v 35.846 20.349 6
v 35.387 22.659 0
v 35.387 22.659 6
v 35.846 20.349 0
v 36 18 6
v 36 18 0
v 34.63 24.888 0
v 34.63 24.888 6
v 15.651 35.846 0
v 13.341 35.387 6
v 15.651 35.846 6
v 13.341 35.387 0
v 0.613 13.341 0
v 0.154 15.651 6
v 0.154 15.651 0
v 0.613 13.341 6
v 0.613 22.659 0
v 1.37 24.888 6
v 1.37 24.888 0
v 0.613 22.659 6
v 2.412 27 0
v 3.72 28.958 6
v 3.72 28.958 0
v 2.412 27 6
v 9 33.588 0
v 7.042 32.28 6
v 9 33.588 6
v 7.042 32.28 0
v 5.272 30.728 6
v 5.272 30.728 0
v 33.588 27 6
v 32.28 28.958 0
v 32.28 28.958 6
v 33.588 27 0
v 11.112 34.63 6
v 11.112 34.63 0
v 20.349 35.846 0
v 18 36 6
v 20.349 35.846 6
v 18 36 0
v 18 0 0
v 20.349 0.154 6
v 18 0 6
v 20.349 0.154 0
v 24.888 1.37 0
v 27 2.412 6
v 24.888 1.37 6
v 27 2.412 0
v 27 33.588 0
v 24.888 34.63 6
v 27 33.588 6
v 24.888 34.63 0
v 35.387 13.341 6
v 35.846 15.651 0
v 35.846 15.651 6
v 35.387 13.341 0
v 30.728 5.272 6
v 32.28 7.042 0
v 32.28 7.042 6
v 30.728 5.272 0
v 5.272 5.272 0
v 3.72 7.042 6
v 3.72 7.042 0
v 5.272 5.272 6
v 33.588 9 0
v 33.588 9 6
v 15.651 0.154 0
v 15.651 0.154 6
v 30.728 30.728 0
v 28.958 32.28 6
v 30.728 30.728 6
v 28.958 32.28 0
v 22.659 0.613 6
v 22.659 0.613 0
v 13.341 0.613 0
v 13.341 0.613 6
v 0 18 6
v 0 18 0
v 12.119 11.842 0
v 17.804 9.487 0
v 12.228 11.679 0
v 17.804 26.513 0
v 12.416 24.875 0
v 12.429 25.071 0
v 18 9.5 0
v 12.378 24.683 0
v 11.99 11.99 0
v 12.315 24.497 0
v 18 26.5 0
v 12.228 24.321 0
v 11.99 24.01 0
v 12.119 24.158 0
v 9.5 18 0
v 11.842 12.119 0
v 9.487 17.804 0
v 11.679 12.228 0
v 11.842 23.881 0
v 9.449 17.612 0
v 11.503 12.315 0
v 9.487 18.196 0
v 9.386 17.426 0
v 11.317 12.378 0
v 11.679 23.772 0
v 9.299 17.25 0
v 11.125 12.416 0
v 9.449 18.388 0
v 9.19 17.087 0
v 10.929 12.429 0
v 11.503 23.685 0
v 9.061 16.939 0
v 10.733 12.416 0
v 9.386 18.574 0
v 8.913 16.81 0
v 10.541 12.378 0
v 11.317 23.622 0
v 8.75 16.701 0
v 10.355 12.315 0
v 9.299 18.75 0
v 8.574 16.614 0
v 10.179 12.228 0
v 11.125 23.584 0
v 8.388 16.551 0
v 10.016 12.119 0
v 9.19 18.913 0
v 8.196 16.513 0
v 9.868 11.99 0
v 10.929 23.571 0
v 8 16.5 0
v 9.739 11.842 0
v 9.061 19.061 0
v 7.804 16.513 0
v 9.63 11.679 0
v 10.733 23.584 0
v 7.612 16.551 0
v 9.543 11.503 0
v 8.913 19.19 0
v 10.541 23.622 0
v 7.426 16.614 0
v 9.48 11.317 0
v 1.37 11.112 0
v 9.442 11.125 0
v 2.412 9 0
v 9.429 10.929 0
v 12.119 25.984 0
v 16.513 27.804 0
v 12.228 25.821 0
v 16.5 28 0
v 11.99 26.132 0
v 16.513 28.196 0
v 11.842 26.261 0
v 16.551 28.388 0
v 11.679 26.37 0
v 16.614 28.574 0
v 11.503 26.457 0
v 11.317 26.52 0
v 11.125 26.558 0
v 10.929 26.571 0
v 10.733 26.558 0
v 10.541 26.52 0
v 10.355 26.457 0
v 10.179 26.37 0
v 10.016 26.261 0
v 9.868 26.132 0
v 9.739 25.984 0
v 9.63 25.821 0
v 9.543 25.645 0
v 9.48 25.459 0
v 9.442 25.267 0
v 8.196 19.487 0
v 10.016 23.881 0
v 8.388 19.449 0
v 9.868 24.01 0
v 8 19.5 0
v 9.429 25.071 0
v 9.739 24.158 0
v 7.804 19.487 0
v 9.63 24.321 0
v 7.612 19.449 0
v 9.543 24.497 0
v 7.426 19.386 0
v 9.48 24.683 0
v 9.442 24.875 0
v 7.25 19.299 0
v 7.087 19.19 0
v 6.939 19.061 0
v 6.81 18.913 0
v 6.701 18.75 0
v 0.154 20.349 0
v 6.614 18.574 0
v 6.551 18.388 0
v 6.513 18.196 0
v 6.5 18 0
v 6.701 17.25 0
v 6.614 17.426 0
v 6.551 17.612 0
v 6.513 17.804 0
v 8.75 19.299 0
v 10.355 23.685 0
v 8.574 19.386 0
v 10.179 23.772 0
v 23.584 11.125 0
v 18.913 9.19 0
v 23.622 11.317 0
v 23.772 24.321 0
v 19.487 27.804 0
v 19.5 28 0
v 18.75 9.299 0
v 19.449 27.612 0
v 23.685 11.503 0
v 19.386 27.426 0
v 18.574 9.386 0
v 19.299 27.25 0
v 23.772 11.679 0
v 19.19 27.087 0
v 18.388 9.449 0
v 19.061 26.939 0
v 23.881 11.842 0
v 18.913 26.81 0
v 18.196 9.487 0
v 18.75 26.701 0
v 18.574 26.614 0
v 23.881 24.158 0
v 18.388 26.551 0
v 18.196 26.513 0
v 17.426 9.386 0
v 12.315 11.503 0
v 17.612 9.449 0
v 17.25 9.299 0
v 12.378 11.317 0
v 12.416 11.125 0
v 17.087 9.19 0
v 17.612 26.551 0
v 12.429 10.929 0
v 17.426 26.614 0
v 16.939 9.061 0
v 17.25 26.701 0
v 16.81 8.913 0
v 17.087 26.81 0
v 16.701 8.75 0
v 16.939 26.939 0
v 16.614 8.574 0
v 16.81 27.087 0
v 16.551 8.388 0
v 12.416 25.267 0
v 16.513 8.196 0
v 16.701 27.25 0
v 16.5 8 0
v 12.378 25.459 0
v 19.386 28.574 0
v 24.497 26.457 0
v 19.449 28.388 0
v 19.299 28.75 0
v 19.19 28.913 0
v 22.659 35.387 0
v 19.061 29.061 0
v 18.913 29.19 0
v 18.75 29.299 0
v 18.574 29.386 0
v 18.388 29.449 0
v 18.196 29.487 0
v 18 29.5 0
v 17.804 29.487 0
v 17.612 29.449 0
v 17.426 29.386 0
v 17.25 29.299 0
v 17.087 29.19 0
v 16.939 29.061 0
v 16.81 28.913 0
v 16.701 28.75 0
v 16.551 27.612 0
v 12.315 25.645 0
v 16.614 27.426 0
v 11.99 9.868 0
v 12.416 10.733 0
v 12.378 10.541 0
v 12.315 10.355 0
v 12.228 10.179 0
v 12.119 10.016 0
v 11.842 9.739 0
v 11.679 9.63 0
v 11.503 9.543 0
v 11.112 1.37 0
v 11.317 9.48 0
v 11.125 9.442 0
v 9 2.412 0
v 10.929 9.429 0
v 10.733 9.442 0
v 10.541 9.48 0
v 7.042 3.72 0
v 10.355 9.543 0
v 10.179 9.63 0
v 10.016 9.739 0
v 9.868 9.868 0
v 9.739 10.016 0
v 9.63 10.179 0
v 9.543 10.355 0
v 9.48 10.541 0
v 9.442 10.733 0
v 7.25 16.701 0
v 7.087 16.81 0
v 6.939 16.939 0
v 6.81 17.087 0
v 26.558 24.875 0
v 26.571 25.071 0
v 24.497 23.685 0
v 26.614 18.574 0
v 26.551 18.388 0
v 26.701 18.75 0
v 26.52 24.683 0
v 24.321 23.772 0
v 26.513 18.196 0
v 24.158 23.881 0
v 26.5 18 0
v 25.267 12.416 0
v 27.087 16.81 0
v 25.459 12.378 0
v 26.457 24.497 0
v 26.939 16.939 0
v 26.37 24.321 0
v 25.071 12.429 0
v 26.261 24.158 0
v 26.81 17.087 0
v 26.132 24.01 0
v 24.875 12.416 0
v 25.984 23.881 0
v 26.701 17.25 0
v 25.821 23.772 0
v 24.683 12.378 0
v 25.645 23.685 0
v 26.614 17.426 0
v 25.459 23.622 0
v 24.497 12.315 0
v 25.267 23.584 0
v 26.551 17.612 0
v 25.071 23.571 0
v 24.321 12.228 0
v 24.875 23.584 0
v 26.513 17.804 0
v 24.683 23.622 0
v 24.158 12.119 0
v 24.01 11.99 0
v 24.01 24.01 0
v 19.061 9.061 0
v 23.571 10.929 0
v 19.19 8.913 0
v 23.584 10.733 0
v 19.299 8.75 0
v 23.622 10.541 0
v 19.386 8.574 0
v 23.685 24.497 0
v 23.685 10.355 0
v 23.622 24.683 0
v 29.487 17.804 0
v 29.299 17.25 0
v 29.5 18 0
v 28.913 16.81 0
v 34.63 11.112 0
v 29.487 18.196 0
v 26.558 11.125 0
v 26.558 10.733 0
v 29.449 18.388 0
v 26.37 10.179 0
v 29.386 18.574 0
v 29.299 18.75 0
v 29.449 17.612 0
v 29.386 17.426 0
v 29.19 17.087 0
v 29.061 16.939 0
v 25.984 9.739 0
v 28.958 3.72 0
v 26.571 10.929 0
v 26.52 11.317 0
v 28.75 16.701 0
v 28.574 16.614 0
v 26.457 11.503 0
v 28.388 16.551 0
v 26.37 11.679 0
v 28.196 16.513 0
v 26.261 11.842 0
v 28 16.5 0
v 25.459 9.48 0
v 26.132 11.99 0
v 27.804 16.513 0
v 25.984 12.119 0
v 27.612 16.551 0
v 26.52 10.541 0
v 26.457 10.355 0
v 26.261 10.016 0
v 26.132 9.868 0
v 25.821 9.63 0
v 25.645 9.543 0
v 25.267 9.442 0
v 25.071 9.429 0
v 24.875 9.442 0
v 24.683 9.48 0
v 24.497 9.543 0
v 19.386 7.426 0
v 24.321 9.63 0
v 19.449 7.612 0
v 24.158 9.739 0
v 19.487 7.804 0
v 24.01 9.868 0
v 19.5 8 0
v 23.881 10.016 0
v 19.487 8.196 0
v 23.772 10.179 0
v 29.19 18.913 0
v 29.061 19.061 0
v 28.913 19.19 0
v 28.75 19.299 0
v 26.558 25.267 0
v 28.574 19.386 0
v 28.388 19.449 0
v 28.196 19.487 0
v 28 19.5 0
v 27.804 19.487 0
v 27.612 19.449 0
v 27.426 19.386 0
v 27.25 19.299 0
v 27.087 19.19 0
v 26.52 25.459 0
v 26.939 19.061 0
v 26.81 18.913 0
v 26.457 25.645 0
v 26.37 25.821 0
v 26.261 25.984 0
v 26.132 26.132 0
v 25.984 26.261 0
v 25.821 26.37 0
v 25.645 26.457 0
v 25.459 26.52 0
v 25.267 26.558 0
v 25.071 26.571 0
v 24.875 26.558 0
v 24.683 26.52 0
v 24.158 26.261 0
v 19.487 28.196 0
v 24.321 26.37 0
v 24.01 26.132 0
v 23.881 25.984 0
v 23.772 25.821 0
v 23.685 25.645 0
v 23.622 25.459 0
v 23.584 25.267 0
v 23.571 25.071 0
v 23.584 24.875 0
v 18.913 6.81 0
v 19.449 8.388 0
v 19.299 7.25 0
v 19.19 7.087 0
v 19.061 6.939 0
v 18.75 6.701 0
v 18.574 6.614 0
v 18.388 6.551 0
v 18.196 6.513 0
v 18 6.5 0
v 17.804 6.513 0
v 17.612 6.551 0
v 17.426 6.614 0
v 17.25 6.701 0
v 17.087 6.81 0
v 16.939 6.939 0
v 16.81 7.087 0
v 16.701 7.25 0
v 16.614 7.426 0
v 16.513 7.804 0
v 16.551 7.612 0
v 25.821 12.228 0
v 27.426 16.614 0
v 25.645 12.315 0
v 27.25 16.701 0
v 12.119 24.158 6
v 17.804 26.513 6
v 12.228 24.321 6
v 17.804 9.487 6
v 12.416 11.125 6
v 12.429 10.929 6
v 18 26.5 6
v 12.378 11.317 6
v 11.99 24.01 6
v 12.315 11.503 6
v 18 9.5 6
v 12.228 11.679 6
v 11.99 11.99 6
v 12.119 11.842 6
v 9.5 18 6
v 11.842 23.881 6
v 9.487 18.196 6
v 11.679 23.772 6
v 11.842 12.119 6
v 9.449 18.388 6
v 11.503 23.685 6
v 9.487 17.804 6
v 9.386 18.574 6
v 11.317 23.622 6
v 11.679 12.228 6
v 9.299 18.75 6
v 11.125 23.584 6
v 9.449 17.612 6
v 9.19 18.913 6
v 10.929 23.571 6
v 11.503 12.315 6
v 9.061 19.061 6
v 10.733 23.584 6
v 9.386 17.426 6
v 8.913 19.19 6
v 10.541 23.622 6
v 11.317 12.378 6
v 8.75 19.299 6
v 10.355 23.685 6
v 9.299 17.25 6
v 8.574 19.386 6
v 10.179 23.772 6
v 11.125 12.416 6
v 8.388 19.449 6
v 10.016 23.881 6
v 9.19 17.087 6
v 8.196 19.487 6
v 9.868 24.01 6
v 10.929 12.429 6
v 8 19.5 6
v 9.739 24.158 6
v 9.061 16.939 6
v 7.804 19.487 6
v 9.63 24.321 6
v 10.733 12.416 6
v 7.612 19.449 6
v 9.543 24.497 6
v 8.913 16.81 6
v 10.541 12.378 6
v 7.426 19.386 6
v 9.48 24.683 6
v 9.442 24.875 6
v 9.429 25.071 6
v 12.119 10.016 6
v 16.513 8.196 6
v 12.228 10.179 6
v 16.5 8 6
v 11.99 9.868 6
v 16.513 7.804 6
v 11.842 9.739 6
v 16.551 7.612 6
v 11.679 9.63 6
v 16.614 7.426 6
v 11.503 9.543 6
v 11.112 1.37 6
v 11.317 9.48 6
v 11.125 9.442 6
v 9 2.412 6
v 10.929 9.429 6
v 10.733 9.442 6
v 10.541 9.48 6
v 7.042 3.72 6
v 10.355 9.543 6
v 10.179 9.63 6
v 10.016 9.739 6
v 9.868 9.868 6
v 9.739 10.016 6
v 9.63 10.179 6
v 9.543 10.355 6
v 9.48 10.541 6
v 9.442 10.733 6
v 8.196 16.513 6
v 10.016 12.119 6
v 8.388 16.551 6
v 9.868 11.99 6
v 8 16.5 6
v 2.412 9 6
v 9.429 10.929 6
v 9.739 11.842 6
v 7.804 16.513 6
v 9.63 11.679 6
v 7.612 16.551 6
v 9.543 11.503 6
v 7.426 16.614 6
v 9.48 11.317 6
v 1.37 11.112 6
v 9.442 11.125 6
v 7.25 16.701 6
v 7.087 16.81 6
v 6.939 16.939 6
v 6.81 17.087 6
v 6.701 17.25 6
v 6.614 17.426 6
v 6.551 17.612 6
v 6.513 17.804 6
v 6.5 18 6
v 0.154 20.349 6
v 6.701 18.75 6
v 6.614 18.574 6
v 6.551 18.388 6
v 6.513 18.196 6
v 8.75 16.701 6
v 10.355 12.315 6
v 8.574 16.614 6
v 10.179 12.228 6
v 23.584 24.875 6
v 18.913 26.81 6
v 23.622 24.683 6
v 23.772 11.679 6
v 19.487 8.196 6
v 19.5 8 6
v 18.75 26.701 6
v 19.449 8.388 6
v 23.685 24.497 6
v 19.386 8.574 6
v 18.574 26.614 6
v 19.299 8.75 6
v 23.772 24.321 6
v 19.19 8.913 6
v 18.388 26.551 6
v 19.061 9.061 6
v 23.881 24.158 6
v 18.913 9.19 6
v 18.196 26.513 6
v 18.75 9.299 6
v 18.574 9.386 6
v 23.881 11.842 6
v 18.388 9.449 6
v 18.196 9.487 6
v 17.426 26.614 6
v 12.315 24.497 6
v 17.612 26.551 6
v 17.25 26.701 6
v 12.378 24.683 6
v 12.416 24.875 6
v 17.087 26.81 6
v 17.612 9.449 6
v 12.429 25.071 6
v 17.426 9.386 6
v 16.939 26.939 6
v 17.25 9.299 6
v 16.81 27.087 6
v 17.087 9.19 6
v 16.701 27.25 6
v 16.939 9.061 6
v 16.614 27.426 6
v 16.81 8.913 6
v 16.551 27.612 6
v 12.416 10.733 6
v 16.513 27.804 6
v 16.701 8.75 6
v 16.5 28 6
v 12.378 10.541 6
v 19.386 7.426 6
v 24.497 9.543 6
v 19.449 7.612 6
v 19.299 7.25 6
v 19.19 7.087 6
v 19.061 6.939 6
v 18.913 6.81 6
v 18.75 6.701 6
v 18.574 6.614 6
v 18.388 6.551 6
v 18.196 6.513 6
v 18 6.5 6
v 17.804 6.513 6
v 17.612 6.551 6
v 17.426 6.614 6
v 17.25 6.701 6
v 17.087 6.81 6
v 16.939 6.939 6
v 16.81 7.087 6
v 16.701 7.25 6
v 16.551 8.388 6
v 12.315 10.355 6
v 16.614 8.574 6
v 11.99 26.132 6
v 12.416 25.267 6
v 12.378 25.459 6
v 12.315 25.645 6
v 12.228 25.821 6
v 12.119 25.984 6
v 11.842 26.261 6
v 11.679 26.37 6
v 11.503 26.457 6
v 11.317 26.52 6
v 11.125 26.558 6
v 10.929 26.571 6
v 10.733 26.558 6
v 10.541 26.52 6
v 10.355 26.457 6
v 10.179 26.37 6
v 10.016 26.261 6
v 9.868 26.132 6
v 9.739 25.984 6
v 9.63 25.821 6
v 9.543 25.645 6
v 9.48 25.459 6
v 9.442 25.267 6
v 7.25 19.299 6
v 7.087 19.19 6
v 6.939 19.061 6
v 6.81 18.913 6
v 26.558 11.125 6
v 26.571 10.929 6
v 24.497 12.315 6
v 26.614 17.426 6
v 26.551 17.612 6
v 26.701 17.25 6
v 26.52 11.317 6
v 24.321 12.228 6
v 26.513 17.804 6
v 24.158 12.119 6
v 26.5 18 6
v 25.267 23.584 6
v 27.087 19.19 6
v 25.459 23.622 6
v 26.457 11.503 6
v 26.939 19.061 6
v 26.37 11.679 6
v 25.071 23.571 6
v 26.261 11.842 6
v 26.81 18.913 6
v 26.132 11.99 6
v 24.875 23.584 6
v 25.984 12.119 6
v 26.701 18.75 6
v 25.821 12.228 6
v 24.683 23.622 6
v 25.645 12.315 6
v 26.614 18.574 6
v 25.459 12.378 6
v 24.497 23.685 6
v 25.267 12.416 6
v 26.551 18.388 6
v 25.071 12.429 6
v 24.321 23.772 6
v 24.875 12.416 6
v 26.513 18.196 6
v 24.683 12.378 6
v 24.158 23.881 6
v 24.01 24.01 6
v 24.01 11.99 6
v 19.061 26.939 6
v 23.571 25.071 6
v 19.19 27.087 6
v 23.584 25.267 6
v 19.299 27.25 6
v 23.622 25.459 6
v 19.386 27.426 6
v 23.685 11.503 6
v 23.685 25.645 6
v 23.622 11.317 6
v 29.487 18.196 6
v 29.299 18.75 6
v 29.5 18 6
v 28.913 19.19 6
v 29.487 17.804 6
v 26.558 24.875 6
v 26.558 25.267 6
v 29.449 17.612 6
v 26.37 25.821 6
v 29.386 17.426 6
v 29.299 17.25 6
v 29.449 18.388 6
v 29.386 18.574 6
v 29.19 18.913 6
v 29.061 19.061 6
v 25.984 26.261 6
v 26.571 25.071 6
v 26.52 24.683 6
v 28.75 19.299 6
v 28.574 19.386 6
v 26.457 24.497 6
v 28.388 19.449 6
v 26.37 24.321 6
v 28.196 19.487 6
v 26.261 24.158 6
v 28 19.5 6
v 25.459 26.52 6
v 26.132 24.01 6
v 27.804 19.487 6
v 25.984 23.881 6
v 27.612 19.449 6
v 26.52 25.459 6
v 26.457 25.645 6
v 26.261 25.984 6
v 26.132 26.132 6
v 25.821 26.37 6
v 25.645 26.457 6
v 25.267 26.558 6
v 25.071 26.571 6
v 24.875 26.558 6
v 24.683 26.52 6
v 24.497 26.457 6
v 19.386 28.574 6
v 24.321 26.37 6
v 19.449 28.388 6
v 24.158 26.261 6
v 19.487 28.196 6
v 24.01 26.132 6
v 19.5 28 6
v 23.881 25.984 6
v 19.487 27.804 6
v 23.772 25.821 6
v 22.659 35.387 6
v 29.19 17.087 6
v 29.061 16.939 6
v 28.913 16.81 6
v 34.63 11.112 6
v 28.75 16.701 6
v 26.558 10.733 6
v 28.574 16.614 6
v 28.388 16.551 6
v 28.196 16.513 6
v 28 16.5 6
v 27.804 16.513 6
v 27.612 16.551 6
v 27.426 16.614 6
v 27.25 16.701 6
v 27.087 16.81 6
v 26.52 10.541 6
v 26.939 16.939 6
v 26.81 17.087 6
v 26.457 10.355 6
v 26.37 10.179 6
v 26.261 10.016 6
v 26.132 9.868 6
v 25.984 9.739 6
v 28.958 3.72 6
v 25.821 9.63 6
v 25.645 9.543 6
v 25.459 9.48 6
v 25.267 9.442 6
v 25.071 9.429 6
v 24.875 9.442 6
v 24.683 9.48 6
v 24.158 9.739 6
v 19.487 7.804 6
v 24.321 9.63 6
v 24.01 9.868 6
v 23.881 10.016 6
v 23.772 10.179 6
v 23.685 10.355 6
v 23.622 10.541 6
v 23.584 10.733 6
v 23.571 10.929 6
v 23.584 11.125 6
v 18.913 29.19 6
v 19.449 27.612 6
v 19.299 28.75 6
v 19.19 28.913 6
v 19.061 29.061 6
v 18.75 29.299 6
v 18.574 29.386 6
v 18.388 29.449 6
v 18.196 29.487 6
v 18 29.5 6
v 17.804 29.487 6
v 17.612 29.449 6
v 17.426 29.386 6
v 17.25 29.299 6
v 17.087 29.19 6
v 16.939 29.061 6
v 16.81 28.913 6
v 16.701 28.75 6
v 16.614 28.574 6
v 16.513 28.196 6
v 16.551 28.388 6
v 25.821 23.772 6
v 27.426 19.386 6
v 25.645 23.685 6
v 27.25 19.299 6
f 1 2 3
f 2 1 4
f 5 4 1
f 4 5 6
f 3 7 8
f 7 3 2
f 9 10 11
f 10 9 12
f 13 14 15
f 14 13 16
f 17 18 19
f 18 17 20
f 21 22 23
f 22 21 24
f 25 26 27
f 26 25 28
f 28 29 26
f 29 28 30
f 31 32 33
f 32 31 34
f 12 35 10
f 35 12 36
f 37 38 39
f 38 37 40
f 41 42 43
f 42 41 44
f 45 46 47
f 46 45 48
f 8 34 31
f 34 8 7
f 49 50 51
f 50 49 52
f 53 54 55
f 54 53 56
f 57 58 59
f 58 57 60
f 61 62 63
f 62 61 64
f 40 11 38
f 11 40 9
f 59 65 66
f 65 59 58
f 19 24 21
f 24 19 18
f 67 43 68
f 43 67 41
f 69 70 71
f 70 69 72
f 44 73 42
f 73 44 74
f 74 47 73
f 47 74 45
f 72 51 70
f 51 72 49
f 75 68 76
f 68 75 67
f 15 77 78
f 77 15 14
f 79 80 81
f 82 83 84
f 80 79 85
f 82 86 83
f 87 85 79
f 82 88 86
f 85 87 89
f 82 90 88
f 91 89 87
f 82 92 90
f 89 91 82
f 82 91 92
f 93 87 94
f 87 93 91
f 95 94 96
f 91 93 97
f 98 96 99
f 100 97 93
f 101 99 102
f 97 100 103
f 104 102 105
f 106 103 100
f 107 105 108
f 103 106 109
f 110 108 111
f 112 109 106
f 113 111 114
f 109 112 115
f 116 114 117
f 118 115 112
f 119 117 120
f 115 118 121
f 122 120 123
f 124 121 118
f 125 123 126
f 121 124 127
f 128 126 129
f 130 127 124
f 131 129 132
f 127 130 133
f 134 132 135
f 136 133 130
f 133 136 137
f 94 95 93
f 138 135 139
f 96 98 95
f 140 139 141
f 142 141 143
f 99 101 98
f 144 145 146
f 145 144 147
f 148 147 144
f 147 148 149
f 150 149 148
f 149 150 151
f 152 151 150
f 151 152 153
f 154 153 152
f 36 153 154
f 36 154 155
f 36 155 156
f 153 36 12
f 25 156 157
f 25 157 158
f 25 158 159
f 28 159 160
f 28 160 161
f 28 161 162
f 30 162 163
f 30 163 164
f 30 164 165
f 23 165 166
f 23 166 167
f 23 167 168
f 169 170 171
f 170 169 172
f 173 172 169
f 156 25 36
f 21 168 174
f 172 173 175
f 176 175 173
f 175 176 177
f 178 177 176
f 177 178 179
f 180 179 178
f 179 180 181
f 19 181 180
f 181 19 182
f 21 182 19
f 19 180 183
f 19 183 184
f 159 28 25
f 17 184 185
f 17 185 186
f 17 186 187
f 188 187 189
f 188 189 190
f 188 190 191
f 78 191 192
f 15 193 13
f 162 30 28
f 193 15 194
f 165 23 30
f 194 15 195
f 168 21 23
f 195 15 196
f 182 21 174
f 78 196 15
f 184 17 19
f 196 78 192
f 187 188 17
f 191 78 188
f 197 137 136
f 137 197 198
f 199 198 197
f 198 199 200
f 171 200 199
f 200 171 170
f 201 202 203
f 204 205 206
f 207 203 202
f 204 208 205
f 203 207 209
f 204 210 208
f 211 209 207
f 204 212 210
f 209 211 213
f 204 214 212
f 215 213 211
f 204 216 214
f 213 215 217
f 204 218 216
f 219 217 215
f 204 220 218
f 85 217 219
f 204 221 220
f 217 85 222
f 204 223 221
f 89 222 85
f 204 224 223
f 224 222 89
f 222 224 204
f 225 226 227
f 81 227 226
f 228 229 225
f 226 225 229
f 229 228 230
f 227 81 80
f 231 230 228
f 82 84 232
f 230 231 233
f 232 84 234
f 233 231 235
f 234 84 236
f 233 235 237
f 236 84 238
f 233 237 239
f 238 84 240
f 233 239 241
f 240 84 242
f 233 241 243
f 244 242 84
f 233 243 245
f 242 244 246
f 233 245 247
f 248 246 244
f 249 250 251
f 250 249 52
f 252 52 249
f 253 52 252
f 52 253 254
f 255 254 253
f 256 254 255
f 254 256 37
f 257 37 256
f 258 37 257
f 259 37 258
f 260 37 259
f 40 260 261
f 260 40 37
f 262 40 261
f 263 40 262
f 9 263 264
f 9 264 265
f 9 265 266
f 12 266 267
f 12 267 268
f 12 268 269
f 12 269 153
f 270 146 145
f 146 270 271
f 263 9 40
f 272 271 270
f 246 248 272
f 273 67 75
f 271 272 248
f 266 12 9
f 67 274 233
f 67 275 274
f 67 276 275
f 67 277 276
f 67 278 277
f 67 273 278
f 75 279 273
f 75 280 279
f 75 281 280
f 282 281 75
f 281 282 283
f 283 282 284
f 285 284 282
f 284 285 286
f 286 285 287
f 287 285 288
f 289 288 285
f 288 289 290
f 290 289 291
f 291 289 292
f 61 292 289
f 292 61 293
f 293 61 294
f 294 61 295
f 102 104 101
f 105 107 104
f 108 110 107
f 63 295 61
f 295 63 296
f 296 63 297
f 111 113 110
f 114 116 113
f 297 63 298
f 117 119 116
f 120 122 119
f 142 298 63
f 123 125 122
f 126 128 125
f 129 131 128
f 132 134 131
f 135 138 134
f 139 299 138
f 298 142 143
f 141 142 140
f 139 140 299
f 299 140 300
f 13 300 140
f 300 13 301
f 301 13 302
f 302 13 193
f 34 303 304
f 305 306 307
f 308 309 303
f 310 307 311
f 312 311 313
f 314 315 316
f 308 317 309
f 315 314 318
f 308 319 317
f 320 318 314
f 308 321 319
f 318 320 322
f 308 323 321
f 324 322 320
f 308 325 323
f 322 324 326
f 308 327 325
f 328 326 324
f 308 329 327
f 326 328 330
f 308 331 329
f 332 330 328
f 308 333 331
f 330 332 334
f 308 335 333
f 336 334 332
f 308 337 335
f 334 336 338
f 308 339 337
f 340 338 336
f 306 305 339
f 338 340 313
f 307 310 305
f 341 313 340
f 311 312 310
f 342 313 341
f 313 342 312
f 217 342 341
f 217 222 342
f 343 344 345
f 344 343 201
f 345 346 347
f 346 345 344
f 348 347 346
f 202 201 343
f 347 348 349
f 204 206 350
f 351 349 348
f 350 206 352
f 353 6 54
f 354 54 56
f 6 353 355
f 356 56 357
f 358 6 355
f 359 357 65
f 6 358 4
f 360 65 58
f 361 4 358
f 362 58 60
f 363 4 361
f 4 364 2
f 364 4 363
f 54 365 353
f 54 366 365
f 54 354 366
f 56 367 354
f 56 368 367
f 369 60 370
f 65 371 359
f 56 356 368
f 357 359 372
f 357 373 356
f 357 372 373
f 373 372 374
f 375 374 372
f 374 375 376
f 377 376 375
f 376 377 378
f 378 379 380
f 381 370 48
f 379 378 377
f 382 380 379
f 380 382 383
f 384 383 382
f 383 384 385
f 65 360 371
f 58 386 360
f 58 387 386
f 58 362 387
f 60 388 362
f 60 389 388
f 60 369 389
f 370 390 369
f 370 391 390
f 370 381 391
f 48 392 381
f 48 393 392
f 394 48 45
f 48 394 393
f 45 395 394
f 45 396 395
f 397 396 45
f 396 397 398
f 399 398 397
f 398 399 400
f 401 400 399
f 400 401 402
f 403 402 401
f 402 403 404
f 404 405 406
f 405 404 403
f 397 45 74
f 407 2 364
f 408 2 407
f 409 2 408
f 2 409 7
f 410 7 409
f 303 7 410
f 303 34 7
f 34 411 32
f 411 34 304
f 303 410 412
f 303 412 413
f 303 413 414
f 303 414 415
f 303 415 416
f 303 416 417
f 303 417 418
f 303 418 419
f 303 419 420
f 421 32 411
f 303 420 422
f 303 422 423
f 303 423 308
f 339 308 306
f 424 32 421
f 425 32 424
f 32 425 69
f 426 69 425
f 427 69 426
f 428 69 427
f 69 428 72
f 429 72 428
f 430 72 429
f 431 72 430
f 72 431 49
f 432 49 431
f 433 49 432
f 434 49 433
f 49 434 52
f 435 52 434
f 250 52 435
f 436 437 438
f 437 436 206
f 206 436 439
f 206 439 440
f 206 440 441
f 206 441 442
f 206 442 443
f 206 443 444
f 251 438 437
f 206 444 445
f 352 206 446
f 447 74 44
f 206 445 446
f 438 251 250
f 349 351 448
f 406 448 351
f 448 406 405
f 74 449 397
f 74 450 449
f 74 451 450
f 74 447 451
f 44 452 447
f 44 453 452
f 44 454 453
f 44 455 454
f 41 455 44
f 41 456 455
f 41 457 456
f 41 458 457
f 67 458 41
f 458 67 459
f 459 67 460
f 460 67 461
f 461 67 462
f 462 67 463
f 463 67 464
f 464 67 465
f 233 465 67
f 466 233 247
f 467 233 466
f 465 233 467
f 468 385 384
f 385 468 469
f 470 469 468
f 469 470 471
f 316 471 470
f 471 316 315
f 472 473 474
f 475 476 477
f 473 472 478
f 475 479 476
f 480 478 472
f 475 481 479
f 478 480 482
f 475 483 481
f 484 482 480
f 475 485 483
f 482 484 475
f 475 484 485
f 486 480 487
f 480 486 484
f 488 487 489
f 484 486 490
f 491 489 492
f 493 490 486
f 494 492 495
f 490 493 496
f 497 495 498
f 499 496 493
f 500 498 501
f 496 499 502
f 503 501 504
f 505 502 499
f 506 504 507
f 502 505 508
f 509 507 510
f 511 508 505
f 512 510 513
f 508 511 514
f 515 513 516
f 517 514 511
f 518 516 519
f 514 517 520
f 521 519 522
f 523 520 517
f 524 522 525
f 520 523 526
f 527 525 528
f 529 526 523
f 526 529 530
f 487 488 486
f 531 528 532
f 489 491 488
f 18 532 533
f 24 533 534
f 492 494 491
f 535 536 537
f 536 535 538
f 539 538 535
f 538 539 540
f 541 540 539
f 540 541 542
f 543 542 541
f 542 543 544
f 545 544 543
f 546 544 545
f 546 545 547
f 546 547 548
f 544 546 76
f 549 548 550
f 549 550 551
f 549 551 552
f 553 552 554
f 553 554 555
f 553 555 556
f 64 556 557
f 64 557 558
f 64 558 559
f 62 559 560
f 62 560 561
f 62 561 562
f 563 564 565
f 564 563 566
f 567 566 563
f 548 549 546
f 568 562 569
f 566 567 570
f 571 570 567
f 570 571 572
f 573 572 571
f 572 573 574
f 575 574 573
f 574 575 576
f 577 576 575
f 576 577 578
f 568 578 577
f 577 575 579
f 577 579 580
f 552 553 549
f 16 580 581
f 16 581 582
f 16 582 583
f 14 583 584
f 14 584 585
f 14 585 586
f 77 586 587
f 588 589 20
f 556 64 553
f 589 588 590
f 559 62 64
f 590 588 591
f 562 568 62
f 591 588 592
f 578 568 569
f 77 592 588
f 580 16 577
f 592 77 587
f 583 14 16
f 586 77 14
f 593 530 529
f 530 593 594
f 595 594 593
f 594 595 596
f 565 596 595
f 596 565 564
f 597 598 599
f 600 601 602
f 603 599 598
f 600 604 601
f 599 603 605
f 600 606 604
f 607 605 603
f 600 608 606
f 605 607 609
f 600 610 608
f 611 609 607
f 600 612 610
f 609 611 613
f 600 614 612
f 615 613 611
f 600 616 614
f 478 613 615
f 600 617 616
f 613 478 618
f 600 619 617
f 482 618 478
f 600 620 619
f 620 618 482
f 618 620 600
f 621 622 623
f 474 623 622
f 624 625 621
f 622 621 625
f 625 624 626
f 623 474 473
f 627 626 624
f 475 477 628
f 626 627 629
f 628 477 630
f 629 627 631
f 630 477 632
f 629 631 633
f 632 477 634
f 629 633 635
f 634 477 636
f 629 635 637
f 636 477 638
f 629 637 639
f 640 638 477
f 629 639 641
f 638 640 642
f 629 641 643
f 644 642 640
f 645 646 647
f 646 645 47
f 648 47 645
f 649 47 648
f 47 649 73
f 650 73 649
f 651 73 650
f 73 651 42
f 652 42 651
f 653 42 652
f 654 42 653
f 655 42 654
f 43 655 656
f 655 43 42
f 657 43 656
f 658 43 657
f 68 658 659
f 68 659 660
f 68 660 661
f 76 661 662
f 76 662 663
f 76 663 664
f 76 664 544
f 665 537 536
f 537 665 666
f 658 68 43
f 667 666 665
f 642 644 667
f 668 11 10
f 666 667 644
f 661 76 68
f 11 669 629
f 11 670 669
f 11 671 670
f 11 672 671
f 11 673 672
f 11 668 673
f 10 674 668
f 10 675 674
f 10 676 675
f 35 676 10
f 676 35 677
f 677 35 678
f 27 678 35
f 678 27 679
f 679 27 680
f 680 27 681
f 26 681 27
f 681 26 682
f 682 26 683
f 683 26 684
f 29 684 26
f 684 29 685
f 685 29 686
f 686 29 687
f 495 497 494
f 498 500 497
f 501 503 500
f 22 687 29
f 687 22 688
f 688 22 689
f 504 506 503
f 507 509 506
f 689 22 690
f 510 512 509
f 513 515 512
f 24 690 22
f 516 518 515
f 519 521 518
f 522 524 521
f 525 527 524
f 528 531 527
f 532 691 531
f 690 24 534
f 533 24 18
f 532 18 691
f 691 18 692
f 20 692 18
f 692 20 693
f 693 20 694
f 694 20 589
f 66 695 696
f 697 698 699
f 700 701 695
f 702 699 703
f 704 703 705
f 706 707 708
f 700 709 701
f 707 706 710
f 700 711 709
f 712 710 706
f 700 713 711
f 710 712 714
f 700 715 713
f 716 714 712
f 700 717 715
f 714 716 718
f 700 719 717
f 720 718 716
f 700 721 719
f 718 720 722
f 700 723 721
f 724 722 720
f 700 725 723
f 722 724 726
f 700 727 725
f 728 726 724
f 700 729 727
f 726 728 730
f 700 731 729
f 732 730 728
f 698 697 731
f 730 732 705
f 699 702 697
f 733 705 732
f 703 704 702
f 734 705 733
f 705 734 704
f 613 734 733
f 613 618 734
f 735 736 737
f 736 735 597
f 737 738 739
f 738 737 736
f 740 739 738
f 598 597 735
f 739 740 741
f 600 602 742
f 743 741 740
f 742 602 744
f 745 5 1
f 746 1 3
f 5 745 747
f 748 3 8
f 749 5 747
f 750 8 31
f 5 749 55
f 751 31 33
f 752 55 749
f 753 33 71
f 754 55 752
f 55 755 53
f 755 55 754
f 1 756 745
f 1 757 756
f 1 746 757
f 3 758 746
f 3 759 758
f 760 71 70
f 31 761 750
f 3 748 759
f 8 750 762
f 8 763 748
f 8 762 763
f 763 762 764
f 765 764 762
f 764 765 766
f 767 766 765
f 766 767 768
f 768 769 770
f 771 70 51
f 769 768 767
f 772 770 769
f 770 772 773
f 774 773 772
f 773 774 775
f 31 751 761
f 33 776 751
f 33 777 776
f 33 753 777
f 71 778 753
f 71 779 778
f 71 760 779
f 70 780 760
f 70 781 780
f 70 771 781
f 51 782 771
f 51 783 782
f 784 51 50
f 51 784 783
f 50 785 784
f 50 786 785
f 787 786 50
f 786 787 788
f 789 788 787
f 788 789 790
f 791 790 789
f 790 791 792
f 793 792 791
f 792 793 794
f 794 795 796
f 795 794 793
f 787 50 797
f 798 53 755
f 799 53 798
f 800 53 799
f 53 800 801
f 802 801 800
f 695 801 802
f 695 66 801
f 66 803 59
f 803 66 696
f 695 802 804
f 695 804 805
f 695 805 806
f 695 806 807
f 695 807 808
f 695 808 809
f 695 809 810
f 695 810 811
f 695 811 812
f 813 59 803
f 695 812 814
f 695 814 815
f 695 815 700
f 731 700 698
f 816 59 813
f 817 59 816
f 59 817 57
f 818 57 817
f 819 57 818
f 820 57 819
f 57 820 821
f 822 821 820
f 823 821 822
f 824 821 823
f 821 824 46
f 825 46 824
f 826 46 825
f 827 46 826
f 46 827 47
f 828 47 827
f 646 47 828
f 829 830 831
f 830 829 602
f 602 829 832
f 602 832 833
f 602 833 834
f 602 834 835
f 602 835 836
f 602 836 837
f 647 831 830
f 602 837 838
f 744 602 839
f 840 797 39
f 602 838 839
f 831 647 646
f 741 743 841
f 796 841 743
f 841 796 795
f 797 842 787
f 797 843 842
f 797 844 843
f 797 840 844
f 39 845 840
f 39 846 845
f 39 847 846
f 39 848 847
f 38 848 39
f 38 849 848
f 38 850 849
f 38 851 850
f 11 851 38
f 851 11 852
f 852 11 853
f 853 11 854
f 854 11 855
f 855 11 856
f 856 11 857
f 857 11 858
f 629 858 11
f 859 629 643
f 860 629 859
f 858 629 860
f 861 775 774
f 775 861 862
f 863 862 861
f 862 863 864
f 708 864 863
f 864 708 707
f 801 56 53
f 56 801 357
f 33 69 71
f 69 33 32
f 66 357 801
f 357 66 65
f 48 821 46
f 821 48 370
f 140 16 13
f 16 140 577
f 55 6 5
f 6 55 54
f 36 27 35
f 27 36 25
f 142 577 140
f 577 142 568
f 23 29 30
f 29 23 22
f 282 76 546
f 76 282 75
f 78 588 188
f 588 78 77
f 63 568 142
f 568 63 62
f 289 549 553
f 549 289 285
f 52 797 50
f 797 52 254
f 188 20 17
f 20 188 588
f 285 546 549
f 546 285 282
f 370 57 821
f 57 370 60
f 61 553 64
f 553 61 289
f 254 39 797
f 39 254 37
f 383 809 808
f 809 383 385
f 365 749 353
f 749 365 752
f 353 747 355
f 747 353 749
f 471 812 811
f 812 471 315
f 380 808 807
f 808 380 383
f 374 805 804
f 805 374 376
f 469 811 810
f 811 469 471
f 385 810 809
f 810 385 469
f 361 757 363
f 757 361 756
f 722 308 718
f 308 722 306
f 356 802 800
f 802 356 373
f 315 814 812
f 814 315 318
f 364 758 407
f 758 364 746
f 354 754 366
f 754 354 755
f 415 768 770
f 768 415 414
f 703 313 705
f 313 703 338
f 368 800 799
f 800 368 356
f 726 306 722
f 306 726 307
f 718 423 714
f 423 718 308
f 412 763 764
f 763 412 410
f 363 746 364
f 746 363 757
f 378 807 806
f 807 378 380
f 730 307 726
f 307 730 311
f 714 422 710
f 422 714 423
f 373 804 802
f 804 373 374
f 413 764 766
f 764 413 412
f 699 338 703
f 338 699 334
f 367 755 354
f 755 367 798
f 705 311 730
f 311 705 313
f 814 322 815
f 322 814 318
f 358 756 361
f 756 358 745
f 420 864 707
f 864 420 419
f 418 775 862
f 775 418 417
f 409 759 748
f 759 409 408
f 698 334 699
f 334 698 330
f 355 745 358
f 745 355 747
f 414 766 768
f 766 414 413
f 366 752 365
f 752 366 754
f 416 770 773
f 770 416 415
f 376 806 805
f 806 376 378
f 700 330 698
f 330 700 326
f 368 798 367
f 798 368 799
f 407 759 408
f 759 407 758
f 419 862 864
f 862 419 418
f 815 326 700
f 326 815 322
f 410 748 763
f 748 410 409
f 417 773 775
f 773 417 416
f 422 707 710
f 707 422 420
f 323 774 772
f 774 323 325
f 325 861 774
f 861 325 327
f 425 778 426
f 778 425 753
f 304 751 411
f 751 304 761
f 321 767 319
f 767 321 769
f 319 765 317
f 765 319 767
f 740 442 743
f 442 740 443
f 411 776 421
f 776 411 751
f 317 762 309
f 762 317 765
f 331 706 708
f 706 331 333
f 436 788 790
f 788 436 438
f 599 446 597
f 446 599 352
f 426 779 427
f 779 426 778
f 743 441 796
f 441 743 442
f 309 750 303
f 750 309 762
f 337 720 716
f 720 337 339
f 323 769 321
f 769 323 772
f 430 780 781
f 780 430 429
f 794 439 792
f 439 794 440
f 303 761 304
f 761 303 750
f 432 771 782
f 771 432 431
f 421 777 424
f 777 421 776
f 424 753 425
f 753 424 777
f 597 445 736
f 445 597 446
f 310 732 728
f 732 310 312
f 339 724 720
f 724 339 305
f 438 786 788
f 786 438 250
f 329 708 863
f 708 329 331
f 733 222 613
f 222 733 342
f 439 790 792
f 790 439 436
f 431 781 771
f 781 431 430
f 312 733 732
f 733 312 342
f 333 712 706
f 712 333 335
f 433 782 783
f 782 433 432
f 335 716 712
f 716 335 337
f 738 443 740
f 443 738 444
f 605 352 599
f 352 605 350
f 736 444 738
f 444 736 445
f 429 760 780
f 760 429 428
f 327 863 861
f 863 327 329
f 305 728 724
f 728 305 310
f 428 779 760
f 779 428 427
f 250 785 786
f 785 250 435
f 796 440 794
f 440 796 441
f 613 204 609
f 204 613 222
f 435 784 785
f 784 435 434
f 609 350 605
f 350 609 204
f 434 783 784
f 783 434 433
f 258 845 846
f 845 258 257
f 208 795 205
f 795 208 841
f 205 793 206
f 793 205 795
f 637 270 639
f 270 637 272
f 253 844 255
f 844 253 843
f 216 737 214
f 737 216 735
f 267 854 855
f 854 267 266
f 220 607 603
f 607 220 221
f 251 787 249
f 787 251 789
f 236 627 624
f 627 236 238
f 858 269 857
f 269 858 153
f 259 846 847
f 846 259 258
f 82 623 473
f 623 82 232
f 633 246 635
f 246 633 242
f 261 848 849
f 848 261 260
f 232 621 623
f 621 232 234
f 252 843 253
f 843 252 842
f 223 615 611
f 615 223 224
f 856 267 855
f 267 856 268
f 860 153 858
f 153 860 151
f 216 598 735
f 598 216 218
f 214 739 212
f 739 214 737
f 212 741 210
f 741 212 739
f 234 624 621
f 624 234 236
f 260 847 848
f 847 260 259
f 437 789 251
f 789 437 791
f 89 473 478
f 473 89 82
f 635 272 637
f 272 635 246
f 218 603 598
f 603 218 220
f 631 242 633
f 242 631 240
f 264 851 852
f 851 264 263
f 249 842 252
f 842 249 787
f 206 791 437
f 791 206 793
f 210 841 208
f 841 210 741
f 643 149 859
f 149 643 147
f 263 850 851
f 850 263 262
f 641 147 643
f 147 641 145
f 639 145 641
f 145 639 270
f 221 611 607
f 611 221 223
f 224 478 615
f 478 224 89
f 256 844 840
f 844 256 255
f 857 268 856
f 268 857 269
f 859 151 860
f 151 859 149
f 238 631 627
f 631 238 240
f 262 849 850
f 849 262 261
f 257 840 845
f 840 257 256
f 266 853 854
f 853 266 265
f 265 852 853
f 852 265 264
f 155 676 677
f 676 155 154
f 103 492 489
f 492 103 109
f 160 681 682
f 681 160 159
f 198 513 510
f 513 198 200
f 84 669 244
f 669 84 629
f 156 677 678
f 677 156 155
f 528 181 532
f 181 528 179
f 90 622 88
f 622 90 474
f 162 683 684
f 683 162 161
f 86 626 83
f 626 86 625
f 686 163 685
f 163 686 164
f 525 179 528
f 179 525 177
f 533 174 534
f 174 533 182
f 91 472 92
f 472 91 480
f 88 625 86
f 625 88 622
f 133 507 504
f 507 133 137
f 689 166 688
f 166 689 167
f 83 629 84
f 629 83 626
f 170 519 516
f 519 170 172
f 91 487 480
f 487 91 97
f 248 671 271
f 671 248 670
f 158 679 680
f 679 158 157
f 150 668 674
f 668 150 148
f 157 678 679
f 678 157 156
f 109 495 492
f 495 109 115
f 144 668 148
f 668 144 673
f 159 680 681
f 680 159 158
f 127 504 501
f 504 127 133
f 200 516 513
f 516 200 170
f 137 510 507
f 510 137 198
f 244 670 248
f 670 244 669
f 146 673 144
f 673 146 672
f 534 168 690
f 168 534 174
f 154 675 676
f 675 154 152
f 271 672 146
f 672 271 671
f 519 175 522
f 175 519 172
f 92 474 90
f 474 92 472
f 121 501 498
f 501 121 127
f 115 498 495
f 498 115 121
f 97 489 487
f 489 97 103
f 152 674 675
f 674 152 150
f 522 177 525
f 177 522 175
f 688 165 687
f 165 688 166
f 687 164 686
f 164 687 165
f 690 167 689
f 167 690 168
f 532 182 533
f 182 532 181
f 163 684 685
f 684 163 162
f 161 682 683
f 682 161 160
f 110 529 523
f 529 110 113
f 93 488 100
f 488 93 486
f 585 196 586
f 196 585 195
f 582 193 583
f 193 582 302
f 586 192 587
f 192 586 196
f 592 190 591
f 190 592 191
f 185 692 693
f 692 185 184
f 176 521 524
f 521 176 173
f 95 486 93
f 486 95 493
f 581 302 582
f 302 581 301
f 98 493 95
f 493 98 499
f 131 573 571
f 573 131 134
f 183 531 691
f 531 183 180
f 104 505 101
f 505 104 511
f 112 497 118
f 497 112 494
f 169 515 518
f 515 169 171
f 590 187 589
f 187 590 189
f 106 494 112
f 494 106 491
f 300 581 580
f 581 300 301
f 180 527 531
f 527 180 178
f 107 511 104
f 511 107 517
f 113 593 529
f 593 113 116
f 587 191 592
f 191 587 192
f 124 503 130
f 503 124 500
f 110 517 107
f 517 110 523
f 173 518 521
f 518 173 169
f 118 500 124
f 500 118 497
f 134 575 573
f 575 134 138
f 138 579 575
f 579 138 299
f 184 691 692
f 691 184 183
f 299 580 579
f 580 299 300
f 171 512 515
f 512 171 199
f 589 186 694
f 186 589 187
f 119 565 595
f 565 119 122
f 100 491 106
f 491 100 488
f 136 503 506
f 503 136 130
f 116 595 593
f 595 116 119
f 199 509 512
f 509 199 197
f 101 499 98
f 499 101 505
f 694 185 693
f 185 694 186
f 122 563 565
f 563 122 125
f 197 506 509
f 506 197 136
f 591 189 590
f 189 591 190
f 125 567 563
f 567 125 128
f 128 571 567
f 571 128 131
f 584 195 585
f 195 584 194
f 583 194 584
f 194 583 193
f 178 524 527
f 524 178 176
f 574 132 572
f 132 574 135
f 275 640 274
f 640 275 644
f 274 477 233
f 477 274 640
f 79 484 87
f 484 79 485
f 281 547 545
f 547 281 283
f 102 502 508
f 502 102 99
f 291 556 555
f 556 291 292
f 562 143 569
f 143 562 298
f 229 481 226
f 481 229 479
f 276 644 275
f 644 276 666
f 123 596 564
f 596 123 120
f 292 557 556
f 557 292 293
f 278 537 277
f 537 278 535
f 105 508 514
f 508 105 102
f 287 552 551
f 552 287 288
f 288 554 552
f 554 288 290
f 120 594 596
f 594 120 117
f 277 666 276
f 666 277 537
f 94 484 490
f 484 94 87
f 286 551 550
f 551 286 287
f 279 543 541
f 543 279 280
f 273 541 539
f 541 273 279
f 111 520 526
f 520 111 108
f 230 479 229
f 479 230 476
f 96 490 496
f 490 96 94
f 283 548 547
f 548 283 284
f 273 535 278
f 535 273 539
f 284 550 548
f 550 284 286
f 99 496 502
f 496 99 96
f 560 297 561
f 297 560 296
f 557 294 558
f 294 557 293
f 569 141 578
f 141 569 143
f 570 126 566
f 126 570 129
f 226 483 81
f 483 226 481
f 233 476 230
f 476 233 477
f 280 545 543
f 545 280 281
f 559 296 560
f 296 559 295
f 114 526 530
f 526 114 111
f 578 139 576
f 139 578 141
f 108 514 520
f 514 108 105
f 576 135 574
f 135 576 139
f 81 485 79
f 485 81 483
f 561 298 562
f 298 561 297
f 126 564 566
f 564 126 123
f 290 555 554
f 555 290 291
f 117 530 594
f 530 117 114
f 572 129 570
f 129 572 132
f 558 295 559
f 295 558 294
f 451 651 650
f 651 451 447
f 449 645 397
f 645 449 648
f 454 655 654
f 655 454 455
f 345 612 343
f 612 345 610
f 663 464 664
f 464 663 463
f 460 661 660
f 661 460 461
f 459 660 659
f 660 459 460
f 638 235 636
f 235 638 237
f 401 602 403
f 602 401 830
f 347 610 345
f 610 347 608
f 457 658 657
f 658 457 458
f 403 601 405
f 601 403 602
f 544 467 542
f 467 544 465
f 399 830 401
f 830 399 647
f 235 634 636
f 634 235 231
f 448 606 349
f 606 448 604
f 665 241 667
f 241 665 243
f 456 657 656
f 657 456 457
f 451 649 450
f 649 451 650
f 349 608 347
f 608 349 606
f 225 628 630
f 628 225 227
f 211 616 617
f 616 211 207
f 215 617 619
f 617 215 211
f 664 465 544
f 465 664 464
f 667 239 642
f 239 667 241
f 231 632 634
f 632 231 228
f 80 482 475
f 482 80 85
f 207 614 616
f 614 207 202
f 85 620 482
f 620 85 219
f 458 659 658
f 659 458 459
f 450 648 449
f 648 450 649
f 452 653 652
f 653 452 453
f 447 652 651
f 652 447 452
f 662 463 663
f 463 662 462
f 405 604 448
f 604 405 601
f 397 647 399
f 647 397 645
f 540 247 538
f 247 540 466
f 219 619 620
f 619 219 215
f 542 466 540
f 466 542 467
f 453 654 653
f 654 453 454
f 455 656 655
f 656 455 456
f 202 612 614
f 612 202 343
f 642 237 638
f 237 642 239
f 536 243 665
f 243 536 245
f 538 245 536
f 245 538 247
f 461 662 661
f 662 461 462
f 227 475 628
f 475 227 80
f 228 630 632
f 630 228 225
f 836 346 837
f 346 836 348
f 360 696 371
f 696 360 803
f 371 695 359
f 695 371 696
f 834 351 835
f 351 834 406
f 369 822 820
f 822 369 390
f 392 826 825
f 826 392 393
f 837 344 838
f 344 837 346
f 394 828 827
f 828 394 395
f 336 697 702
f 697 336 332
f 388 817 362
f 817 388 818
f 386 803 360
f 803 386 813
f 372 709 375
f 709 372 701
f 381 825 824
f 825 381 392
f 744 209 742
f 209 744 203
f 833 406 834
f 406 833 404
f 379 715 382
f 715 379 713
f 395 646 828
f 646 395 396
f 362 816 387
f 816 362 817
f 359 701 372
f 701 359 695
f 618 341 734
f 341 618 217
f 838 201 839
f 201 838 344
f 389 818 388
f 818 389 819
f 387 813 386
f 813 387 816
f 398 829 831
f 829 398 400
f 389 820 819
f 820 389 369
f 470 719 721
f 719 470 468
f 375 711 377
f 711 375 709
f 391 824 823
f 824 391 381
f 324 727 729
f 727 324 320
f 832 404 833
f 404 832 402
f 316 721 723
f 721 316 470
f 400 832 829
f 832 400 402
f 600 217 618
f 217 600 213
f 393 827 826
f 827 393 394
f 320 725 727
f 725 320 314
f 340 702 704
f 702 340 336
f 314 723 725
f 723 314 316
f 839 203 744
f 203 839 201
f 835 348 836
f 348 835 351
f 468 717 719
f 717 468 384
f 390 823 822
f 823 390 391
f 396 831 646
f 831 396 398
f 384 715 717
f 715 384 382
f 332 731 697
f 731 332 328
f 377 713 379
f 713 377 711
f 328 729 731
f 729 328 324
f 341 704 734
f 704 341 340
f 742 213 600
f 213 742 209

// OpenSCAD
// units=mm — generated by scad_emitter.py
// part=unnamed
$fn = 48;

difference() { translate([18, 18, 0]) cylinder(h=6, r=18, $fn=$fn); translate([28, 18, 6.5]) rotate([180, 0, 0]) cylinder(h=7, r=1.5, $fn=$fn); translate([25.0711, 25.0711, 6.5]) rotate([180, 0, 0]) cylinder(h=7, r=1.5, $fn=$fn); translate([18, 28, 6.5]) rotate([180, 0, 0]) cylinder(h=7, r=1.5, $fn=$fn); translate([10.9289, 25.0711, 6.5]) rotate([180, 0, 0]) cylinder(h=7, r=1.5, $fn=$fn); translate([8, 18, 6.5]) rotate([180, 0, 0]) cylinder(h=7, r=1.5, $fn=$fn); translate([10.9289, 10.9289, 6.5]) rotate([180, 0, 0]) cylinder(h=7, r=1.5, $fn=$fn); translate([18, 8, 6.5]) rotate([180, 0, 0]) cylinder(h=7, r=1.5, $fn=$fn); translate([25.0711, 10.9289, 6.5]) rotate([180, 0, 0]) cylinder(h=7, r=1.5, $fn=$fn); }
